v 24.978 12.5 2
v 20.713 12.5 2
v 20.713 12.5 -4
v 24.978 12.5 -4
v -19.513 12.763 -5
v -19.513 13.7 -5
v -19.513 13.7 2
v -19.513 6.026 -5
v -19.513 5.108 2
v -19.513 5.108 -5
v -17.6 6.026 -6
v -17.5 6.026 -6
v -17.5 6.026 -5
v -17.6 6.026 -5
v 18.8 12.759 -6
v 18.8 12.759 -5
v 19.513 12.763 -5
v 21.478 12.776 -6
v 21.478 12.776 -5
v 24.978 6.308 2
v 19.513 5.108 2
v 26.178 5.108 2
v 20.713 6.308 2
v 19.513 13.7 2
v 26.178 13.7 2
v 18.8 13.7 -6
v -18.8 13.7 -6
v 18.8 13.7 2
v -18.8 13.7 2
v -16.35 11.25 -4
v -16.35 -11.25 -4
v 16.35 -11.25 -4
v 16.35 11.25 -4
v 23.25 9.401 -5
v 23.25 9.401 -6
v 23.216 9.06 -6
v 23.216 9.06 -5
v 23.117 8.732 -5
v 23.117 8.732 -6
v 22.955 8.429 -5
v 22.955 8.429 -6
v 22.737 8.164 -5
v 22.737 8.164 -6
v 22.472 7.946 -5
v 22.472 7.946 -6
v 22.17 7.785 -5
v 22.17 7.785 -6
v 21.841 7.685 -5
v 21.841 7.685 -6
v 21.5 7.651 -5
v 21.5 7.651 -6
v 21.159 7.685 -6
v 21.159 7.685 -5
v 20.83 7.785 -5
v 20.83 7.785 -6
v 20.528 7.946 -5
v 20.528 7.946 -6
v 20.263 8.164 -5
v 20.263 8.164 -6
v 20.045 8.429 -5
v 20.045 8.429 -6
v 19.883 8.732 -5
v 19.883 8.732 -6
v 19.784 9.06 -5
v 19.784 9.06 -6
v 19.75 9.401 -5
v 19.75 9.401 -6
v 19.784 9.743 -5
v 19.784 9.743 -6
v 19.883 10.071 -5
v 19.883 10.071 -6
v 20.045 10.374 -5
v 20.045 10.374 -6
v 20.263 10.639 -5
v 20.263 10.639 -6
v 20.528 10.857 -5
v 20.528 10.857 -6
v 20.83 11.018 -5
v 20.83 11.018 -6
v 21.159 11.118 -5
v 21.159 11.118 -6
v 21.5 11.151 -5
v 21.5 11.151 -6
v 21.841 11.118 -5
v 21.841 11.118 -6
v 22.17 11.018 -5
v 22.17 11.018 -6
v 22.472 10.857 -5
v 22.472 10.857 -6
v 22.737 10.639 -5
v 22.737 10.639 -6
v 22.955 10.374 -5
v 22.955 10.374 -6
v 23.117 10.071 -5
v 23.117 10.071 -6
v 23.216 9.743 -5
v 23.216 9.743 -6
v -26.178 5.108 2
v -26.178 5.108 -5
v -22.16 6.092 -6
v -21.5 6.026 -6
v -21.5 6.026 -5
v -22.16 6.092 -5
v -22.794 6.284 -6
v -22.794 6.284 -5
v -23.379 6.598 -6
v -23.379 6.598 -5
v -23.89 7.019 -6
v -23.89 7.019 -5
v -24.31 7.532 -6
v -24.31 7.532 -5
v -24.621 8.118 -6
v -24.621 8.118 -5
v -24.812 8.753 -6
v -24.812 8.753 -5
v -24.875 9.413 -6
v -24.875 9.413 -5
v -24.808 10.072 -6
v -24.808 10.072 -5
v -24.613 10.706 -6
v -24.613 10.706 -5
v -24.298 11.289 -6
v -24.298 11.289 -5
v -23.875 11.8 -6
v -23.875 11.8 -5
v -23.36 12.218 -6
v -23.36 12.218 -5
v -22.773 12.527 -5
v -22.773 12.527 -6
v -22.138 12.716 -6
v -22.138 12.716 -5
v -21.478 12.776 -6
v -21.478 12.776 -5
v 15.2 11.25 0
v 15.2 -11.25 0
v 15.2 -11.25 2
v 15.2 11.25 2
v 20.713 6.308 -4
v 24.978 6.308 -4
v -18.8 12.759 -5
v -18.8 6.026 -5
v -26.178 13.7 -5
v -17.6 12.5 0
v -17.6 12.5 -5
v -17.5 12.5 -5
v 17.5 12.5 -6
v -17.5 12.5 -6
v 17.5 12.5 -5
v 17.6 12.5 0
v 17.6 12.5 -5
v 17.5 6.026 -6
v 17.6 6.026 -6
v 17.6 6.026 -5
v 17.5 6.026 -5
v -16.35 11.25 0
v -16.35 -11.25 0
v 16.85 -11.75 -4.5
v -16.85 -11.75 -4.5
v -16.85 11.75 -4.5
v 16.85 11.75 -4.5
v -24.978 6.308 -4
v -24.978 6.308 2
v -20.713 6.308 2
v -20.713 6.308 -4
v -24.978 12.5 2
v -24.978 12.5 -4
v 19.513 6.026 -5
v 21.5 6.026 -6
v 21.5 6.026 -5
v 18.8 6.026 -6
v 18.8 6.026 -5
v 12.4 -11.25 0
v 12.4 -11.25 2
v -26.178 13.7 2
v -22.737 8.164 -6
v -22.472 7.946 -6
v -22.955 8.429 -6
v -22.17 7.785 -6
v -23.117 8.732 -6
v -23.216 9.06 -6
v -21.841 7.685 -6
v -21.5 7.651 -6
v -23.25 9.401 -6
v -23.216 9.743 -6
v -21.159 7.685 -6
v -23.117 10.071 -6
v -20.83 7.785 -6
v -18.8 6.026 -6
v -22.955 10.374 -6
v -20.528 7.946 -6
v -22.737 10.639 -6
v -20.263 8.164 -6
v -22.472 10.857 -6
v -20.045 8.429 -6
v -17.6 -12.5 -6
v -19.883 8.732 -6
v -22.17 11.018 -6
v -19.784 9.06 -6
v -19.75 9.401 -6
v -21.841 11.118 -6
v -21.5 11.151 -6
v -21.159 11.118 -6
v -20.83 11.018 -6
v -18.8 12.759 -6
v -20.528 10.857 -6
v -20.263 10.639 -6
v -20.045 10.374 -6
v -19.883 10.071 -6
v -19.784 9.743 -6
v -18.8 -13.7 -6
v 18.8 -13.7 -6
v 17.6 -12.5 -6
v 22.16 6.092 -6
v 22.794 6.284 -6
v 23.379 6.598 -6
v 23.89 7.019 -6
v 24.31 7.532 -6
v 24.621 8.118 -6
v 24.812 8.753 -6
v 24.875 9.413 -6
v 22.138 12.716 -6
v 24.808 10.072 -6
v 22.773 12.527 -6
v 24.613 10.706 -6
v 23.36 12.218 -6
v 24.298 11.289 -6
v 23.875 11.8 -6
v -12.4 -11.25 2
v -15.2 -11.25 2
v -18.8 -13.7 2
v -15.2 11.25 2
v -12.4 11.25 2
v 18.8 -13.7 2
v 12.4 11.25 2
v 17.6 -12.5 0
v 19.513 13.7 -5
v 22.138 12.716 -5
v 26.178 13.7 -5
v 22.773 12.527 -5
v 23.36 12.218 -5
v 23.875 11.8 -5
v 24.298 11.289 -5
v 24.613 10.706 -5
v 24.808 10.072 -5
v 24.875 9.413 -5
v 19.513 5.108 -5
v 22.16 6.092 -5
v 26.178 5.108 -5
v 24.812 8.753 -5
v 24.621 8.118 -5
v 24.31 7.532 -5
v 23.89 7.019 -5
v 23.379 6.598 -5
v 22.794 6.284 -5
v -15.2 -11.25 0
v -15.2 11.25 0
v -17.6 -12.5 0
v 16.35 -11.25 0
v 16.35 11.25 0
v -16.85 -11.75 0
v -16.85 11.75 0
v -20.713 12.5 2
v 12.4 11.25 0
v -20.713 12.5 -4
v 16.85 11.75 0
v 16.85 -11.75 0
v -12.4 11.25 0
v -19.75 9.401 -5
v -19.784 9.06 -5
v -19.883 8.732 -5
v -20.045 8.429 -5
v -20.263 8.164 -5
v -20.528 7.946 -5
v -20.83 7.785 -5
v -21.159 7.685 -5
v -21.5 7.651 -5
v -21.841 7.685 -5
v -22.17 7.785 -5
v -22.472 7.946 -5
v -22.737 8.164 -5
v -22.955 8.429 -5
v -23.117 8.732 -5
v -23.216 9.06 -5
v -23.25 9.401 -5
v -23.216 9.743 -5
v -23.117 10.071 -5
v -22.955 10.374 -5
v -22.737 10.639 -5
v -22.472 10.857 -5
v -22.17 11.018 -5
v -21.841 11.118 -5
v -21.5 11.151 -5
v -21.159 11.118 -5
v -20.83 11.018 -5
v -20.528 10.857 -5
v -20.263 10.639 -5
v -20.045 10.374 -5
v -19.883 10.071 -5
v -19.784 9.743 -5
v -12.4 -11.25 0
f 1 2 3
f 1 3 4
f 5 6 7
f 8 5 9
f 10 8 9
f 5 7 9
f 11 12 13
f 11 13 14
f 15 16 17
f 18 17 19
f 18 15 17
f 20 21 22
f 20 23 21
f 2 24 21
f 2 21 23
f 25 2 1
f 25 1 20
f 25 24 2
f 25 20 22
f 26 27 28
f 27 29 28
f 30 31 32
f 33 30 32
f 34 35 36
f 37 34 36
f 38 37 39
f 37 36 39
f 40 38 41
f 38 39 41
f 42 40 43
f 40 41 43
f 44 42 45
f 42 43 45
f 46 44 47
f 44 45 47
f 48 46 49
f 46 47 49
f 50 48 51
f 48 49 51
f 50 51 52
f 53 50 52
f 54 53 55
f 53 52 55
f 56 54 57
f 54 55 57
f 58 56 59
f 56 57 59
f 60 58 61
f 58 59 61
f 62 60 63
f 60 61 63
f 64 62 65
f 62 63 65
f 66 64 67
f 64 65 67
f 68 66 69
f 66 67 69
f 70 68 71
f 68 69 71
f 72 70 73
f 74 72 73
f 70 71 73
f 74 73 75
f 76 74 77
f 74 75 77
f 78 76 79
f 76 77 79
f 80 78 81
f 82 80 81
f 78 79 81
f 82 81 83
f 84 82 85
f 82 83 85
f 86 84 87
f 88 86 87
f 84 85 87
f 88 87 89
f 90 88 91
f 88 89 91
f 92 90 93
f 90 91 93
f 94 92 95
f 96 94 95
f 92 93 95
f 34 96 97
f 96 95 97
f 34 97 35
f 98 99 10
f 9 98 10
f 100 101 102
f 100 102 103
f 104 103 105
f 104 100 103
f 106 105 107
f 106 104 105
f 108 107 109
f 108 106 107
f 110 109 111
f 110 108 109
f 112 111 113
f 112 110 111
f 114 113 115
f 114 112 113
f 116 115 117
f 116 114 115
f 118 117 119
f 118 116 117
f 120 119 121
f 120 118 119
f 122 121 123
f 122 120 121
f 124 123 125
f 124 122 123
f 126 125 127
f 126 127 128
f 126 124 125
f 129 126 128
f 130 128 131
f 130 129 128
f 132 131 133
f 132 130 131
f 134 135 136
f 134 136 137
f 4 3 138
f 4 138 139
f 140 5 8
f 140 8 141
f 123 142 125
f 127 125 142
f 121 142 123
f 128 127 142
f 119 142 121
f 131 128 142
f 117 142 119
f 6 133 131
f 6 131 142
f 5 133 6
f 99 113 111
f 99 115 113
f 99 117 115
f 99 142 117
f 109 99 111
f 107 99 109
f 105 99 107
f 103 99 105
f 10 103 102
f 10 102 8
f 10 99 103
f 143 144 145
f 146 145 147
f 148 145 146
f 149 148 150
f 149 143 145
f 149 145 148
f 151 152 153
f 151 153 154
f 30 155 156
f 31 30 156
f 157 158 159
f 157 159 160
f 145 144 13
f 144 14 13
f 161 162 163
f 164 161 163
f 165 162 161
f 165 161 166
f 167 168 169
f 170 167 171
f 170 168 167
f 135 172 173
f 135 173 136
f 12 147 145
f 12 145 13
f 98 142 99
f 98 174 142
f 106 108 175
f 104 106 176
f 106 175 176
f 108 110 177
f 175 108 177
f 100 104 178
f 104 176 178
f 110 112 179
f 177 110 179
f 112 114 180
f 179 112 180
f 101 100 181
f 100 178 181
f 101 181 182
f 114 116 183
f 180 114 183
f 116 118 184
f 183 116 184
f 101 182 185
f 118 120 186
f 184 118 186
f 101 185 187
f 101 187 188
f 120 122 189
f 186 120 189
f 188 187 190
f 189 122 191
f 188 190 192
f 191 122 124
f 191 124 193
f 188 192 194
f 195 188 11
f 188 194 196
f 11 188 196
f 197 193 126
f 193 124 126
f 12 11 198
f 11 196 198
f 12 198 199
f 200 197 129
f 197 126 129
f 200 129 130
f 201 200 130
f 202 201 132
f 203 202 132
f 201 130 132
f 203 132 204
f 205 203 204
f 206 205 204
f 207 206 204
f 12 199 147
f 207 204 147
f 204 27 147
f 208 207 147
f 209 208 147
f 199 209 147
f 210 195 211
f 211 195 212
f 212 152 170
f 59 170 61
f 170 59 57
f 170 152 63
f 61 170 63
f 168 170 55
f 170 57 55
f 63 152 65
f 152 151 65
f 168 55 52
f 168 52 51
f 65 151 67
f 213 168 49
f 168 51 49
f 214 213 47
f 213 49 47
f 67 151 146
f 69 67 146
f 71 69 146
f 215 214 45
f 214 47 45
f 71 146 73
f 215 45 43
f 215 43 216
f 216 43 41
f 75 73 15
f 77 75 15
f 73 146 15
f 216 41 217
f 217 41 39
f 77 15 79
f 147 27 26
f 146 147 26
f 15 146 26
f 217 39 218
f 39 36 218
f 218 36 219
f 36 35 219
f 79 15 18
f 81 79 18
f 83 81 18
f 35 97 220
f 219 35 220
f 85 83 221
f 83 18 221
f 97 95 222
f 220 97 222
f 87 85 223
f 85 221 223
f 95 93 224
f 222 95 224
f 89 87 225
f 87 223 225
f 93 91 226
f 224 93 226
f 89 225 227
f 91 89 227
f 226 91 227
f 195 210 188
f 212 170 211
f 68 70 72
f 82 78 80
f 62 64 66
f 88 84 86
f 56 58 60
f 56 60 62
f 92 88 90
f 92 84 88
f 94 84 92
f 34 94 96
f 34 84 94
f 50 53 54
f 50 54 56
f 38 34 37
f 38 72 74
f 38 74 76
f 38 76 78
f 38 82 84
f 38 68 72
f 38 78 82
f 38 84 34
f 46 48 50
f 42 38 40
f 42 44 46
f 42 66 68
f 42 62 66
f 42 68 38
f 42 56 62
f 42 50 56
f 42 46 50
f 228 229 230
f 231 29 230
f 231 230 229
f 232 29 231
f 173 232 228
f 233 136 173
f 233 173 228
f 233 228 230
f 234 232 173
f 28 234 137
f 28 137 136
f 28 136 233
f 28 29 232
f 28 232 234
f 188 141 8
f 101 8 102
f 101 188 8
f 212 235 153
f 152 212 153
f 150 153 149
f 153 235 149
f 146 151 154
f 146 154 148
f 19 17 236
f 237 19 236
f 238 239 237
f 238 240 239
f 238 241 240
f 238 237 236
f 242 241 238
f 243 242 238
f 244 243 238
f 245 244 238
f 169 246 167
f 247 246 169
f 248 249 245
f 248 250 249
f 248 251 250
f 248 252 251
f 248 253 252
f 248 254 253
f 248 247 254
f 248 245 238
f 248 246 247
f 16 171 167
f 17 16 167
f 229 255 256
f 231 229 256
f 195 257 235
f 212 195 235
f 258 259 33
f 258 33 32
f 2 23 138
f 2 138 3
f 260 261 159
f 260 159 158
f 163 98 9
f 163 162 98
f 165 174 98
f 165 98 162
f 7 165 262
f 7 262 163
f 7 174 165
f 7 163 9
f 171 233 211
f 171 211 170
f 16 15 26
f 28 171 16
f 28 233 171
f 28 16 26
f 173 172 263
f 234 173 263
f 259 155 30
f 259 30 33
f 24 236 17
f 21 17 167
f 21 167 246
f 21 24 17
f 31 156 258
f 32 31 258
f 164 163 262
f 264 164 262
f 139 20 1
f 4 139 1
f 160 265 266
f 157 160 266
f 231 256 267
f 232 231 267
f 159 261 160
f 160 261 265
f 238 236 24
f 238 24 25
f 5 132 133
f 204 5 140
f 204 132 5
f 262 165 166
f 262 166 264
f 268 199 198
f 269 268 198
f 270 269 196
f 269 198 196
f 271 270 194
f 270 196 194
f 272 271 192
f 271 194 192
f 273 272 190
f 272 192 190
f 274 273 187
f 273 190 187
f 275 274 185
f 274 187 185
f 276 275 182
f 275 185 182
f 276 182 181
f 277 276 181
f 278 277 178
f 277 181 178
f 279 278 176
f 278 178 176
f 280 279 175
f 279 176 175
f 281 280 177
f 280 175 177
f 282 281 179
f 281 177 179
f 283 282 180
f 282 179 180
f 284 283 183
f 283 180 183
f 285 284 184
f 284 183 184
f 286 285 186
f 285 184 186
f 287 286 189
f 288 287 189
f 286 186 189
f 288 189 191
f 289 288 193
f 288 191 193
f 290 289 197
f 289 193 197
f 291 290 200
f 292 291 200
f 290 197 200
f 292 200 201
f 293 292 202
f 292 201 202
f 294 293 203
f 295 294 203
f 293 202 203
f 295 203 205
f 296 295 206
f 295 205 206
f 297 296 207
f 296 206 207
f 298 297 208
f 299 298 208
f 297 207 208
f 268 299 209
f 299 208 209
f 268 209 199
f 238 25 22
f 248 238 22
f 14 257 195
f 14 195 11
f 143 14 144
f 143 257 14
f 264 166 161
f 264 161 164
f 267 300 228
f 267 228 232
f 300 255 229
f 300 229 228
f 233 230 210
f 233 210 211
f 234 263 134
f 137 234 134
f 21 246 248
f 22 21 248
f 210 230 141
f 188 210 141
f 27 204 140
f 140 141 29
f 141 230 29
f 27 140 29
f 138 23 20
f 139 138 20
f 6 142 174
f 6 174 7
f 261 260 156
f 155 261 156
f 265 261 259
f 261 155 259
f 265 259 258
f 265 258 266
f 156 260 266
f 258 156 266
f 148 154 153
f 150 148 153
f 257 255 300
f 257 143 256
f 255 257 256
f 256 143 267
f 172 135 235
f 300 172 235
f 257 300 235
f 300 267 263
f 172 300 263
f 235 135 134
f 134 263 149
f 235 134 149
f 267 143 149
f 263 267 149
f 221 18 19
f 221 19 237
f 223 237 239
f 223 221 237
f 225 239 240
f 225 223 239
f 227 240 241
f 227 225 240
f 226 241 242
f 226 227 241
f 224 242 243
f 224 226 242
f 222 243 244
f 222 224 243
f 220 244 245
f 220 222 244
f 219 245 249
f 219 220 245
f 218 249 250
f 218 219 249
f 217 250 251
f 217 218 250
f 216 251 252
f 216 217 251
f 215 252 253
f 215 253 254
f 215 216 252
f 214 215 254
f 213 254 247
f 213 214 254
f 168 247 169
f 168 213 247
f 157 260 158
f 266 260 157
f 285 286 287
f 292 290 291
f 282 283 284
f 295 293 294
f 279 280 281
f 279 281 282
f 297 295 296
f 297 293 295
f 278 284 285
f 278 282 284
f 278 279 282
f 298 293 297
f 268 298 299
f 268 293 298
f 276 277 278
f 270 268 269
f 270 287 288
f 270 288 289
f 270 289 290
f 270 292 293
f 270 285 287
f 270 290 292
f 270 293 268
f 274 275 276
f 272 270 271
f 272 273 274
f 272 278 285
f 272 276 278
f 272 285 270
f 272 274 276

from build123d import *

# Parameters (mm, degrees)
F0_W           = 37.6000000209
F0_H           = 27.4000000209
F0_W_2         = 35.2
F0_H_2         = 25
F0_W_3         = 2.8
F0_H_3         = 22.5
F1_DEPTH       = 2
F0_W_4         = 6.6650174558
F0_H_4         = 8.5915359668
F2_DEPTH       = 6
F3_R           = 1.75
F4_DEPTH       = 1
F1_FACE_W      = 6.6650174558
F1_FACE_H      = 8.5915359668
F5_DEPTH       = 5
F6_W           = 4.2650178075
F6_H           = 6.1915363185
F7_DEPTH       = 6
F9_W           = 33.7
F9_H           = 23.5
F9_W_2         = 32.7
F9_H_2         = 22.5
F10_DEPTH      = 4.5
F11_DEPTH      = 4.5
F11_DEPTH_BACK = 4


with BuildPart() as f1:
    # F0 (on Top) → F1 (new body)
    with BuildSketch(Plane.XY):
        Rectangle(F0_W, F0_H)
        Rectangle(F0_W_2, F0_H_2, mode=Mode.SUBTRACT)
        Rectangle(F0_W_2, F0_H_2)
        with Locations((-13.8, 0)):
            Rectangle(F0_W_3, F0_H_3, mode=Mode.SUBTRACT)
        with Locations((13.8, 0)):
            Rectangle(F0_W_3, F0_H_3, mode=Mode.SUBTRACT)
    extrude(amount=F1_DEPTH)

    # F0 (on Top) → F2 (join)
    with BuildSketch(Plane.XY):
        Rectangle(F0_W, F0_H)
        Rectangle(F0_W_2, F0_H_2, mode=Mode.SUBTRACT)
    extrude(amount=-F2_DEPTH)

    # F3 (on face) → F4 (join)
    with BuildSketch(Plane(origin=(0, 0, -6), x_dir=(1, 0, 0), z_dir=(0, 0, -1))):
        with BuildLine():
            Line((-17.5, -12.75), (-17.5, -6.0264541484))
            Line((-17.5, -6.0264541484), (-21.5, -6.0264541484))
            ThreePointArc((-21.5, -6.0264541484), (-24.8749814445, -9.4126456206), (-21.4776171787, -12.7763799267))
            Line((-21.4776171787, -12.7763799267), (-17.5, -12.75))
        make_face()
        with Locations((-21.5, -9.4014541484)):
            Circle(F3_R, mode=Mode.SUBTRACT)
        with BuildLine():
            ThreePointArc((21.4776171787, -12.7763799267), (24.8749814445, -9.4126456206), (21.5, -6.0264541484))
            Line((21.5, -6.0264541484), (17.5, -6.0264541484))
            Line((17.5, -6.0264541484), (17.5, -12.75))
            Line((17.5, -12.75), (21.4776171787, -12.7763799267))
        make_face()
        with Locations((21.5, -9.4014541484)):
            Circle(F3_R, mode=Mode.SUBTRACT)
    extrude(amount=-F4_DEPTH)



with BuildPart() as f1b:
    # F0 (on Top) → F1, piece 2 (new body)
    with BuildSketch(Plane.XY):
        with Locations((-22.8454377502, 9.404232027)):
            Rectangle(F0_W_4, F0_H_4)
    extrude(amount=F1_DEPTH)


with BuildPart() as f1c:
    # F0 (on Top) → F1, piece 3 (new body)
    with BuildSketch(Plane.XY):
        with Locations((22.8454377502, 9.404232027)):
            Rectangle(F0_W_4, F0_H_4)
    extrude(amount=F1_DEPTH)


with BuildPart() as f1_1:
    add(f1.part)

    add(f1b.part)  # F5 merges F1b

    add(f1c.part)  # F5 merges F1c
    # F1_face (on face) → F5 (join)
    with BuildSketch(Plane(origin=(-22.8454377502, 9.404232027, 0), x_dir=(1, 0, 0), z_dir=(0, 0, -1))):
        Rectangle(F1_FACE_W, F1_FACE_H)
        with Locations((45.6908755004, 0)):
            Rectangle(F1_FACE_W, F1_FACE_H)
    extrude(amount=F5_DEPTH)

    # F6 (on face) → F7 (cut)
    with BuildSketch(Plane.XY.offset(2)):
        with Locations((-22.8454377502, 9.404232027)):
            Rectangle(F6_W, F6_H)
        with Locations((22.8454377502, 9.404232027)):
            Rectangle(F6_W, F6_H)
    extrude(amount=-F7_DEPTH, mode=Mode.SUBTRACT)


with BuildPart() as f10:
    # F9 (on offset) → F10 (new body)
    with BuildSketch(Plane(origin=(0, 0, 0), x_dir=(1, 0, 0), z_dir=(0, 0, -1))):
        Rectangle(F9_W, F9_H)
        Rectangle(F9_W_2, F9_H_2, mode=Mode.SUBTRACT)
        Rectangle(F9_W_2, F9_H_2)
    extrude(amount=F10_DEPTH)

    # F9 (on offset) → F11 (cut, two sides)
    with BuildSketch(Plane(origin=(0, 0, 0), x_dir=(1, 0, 0), z_dir=(0, 0, -1))) as f11_sk:
        Rectangle(F9_W_2, F9_H_2)
    extrude(amount=-F11_DEPTH, mode=Mode.SUBTRACT)
    extrude(f11_sk.sketch, amount=F11_DEPTH_BACK, mode=Mode.SUBTRACT)


solid = Compound([f1_1.part, f10.part])
